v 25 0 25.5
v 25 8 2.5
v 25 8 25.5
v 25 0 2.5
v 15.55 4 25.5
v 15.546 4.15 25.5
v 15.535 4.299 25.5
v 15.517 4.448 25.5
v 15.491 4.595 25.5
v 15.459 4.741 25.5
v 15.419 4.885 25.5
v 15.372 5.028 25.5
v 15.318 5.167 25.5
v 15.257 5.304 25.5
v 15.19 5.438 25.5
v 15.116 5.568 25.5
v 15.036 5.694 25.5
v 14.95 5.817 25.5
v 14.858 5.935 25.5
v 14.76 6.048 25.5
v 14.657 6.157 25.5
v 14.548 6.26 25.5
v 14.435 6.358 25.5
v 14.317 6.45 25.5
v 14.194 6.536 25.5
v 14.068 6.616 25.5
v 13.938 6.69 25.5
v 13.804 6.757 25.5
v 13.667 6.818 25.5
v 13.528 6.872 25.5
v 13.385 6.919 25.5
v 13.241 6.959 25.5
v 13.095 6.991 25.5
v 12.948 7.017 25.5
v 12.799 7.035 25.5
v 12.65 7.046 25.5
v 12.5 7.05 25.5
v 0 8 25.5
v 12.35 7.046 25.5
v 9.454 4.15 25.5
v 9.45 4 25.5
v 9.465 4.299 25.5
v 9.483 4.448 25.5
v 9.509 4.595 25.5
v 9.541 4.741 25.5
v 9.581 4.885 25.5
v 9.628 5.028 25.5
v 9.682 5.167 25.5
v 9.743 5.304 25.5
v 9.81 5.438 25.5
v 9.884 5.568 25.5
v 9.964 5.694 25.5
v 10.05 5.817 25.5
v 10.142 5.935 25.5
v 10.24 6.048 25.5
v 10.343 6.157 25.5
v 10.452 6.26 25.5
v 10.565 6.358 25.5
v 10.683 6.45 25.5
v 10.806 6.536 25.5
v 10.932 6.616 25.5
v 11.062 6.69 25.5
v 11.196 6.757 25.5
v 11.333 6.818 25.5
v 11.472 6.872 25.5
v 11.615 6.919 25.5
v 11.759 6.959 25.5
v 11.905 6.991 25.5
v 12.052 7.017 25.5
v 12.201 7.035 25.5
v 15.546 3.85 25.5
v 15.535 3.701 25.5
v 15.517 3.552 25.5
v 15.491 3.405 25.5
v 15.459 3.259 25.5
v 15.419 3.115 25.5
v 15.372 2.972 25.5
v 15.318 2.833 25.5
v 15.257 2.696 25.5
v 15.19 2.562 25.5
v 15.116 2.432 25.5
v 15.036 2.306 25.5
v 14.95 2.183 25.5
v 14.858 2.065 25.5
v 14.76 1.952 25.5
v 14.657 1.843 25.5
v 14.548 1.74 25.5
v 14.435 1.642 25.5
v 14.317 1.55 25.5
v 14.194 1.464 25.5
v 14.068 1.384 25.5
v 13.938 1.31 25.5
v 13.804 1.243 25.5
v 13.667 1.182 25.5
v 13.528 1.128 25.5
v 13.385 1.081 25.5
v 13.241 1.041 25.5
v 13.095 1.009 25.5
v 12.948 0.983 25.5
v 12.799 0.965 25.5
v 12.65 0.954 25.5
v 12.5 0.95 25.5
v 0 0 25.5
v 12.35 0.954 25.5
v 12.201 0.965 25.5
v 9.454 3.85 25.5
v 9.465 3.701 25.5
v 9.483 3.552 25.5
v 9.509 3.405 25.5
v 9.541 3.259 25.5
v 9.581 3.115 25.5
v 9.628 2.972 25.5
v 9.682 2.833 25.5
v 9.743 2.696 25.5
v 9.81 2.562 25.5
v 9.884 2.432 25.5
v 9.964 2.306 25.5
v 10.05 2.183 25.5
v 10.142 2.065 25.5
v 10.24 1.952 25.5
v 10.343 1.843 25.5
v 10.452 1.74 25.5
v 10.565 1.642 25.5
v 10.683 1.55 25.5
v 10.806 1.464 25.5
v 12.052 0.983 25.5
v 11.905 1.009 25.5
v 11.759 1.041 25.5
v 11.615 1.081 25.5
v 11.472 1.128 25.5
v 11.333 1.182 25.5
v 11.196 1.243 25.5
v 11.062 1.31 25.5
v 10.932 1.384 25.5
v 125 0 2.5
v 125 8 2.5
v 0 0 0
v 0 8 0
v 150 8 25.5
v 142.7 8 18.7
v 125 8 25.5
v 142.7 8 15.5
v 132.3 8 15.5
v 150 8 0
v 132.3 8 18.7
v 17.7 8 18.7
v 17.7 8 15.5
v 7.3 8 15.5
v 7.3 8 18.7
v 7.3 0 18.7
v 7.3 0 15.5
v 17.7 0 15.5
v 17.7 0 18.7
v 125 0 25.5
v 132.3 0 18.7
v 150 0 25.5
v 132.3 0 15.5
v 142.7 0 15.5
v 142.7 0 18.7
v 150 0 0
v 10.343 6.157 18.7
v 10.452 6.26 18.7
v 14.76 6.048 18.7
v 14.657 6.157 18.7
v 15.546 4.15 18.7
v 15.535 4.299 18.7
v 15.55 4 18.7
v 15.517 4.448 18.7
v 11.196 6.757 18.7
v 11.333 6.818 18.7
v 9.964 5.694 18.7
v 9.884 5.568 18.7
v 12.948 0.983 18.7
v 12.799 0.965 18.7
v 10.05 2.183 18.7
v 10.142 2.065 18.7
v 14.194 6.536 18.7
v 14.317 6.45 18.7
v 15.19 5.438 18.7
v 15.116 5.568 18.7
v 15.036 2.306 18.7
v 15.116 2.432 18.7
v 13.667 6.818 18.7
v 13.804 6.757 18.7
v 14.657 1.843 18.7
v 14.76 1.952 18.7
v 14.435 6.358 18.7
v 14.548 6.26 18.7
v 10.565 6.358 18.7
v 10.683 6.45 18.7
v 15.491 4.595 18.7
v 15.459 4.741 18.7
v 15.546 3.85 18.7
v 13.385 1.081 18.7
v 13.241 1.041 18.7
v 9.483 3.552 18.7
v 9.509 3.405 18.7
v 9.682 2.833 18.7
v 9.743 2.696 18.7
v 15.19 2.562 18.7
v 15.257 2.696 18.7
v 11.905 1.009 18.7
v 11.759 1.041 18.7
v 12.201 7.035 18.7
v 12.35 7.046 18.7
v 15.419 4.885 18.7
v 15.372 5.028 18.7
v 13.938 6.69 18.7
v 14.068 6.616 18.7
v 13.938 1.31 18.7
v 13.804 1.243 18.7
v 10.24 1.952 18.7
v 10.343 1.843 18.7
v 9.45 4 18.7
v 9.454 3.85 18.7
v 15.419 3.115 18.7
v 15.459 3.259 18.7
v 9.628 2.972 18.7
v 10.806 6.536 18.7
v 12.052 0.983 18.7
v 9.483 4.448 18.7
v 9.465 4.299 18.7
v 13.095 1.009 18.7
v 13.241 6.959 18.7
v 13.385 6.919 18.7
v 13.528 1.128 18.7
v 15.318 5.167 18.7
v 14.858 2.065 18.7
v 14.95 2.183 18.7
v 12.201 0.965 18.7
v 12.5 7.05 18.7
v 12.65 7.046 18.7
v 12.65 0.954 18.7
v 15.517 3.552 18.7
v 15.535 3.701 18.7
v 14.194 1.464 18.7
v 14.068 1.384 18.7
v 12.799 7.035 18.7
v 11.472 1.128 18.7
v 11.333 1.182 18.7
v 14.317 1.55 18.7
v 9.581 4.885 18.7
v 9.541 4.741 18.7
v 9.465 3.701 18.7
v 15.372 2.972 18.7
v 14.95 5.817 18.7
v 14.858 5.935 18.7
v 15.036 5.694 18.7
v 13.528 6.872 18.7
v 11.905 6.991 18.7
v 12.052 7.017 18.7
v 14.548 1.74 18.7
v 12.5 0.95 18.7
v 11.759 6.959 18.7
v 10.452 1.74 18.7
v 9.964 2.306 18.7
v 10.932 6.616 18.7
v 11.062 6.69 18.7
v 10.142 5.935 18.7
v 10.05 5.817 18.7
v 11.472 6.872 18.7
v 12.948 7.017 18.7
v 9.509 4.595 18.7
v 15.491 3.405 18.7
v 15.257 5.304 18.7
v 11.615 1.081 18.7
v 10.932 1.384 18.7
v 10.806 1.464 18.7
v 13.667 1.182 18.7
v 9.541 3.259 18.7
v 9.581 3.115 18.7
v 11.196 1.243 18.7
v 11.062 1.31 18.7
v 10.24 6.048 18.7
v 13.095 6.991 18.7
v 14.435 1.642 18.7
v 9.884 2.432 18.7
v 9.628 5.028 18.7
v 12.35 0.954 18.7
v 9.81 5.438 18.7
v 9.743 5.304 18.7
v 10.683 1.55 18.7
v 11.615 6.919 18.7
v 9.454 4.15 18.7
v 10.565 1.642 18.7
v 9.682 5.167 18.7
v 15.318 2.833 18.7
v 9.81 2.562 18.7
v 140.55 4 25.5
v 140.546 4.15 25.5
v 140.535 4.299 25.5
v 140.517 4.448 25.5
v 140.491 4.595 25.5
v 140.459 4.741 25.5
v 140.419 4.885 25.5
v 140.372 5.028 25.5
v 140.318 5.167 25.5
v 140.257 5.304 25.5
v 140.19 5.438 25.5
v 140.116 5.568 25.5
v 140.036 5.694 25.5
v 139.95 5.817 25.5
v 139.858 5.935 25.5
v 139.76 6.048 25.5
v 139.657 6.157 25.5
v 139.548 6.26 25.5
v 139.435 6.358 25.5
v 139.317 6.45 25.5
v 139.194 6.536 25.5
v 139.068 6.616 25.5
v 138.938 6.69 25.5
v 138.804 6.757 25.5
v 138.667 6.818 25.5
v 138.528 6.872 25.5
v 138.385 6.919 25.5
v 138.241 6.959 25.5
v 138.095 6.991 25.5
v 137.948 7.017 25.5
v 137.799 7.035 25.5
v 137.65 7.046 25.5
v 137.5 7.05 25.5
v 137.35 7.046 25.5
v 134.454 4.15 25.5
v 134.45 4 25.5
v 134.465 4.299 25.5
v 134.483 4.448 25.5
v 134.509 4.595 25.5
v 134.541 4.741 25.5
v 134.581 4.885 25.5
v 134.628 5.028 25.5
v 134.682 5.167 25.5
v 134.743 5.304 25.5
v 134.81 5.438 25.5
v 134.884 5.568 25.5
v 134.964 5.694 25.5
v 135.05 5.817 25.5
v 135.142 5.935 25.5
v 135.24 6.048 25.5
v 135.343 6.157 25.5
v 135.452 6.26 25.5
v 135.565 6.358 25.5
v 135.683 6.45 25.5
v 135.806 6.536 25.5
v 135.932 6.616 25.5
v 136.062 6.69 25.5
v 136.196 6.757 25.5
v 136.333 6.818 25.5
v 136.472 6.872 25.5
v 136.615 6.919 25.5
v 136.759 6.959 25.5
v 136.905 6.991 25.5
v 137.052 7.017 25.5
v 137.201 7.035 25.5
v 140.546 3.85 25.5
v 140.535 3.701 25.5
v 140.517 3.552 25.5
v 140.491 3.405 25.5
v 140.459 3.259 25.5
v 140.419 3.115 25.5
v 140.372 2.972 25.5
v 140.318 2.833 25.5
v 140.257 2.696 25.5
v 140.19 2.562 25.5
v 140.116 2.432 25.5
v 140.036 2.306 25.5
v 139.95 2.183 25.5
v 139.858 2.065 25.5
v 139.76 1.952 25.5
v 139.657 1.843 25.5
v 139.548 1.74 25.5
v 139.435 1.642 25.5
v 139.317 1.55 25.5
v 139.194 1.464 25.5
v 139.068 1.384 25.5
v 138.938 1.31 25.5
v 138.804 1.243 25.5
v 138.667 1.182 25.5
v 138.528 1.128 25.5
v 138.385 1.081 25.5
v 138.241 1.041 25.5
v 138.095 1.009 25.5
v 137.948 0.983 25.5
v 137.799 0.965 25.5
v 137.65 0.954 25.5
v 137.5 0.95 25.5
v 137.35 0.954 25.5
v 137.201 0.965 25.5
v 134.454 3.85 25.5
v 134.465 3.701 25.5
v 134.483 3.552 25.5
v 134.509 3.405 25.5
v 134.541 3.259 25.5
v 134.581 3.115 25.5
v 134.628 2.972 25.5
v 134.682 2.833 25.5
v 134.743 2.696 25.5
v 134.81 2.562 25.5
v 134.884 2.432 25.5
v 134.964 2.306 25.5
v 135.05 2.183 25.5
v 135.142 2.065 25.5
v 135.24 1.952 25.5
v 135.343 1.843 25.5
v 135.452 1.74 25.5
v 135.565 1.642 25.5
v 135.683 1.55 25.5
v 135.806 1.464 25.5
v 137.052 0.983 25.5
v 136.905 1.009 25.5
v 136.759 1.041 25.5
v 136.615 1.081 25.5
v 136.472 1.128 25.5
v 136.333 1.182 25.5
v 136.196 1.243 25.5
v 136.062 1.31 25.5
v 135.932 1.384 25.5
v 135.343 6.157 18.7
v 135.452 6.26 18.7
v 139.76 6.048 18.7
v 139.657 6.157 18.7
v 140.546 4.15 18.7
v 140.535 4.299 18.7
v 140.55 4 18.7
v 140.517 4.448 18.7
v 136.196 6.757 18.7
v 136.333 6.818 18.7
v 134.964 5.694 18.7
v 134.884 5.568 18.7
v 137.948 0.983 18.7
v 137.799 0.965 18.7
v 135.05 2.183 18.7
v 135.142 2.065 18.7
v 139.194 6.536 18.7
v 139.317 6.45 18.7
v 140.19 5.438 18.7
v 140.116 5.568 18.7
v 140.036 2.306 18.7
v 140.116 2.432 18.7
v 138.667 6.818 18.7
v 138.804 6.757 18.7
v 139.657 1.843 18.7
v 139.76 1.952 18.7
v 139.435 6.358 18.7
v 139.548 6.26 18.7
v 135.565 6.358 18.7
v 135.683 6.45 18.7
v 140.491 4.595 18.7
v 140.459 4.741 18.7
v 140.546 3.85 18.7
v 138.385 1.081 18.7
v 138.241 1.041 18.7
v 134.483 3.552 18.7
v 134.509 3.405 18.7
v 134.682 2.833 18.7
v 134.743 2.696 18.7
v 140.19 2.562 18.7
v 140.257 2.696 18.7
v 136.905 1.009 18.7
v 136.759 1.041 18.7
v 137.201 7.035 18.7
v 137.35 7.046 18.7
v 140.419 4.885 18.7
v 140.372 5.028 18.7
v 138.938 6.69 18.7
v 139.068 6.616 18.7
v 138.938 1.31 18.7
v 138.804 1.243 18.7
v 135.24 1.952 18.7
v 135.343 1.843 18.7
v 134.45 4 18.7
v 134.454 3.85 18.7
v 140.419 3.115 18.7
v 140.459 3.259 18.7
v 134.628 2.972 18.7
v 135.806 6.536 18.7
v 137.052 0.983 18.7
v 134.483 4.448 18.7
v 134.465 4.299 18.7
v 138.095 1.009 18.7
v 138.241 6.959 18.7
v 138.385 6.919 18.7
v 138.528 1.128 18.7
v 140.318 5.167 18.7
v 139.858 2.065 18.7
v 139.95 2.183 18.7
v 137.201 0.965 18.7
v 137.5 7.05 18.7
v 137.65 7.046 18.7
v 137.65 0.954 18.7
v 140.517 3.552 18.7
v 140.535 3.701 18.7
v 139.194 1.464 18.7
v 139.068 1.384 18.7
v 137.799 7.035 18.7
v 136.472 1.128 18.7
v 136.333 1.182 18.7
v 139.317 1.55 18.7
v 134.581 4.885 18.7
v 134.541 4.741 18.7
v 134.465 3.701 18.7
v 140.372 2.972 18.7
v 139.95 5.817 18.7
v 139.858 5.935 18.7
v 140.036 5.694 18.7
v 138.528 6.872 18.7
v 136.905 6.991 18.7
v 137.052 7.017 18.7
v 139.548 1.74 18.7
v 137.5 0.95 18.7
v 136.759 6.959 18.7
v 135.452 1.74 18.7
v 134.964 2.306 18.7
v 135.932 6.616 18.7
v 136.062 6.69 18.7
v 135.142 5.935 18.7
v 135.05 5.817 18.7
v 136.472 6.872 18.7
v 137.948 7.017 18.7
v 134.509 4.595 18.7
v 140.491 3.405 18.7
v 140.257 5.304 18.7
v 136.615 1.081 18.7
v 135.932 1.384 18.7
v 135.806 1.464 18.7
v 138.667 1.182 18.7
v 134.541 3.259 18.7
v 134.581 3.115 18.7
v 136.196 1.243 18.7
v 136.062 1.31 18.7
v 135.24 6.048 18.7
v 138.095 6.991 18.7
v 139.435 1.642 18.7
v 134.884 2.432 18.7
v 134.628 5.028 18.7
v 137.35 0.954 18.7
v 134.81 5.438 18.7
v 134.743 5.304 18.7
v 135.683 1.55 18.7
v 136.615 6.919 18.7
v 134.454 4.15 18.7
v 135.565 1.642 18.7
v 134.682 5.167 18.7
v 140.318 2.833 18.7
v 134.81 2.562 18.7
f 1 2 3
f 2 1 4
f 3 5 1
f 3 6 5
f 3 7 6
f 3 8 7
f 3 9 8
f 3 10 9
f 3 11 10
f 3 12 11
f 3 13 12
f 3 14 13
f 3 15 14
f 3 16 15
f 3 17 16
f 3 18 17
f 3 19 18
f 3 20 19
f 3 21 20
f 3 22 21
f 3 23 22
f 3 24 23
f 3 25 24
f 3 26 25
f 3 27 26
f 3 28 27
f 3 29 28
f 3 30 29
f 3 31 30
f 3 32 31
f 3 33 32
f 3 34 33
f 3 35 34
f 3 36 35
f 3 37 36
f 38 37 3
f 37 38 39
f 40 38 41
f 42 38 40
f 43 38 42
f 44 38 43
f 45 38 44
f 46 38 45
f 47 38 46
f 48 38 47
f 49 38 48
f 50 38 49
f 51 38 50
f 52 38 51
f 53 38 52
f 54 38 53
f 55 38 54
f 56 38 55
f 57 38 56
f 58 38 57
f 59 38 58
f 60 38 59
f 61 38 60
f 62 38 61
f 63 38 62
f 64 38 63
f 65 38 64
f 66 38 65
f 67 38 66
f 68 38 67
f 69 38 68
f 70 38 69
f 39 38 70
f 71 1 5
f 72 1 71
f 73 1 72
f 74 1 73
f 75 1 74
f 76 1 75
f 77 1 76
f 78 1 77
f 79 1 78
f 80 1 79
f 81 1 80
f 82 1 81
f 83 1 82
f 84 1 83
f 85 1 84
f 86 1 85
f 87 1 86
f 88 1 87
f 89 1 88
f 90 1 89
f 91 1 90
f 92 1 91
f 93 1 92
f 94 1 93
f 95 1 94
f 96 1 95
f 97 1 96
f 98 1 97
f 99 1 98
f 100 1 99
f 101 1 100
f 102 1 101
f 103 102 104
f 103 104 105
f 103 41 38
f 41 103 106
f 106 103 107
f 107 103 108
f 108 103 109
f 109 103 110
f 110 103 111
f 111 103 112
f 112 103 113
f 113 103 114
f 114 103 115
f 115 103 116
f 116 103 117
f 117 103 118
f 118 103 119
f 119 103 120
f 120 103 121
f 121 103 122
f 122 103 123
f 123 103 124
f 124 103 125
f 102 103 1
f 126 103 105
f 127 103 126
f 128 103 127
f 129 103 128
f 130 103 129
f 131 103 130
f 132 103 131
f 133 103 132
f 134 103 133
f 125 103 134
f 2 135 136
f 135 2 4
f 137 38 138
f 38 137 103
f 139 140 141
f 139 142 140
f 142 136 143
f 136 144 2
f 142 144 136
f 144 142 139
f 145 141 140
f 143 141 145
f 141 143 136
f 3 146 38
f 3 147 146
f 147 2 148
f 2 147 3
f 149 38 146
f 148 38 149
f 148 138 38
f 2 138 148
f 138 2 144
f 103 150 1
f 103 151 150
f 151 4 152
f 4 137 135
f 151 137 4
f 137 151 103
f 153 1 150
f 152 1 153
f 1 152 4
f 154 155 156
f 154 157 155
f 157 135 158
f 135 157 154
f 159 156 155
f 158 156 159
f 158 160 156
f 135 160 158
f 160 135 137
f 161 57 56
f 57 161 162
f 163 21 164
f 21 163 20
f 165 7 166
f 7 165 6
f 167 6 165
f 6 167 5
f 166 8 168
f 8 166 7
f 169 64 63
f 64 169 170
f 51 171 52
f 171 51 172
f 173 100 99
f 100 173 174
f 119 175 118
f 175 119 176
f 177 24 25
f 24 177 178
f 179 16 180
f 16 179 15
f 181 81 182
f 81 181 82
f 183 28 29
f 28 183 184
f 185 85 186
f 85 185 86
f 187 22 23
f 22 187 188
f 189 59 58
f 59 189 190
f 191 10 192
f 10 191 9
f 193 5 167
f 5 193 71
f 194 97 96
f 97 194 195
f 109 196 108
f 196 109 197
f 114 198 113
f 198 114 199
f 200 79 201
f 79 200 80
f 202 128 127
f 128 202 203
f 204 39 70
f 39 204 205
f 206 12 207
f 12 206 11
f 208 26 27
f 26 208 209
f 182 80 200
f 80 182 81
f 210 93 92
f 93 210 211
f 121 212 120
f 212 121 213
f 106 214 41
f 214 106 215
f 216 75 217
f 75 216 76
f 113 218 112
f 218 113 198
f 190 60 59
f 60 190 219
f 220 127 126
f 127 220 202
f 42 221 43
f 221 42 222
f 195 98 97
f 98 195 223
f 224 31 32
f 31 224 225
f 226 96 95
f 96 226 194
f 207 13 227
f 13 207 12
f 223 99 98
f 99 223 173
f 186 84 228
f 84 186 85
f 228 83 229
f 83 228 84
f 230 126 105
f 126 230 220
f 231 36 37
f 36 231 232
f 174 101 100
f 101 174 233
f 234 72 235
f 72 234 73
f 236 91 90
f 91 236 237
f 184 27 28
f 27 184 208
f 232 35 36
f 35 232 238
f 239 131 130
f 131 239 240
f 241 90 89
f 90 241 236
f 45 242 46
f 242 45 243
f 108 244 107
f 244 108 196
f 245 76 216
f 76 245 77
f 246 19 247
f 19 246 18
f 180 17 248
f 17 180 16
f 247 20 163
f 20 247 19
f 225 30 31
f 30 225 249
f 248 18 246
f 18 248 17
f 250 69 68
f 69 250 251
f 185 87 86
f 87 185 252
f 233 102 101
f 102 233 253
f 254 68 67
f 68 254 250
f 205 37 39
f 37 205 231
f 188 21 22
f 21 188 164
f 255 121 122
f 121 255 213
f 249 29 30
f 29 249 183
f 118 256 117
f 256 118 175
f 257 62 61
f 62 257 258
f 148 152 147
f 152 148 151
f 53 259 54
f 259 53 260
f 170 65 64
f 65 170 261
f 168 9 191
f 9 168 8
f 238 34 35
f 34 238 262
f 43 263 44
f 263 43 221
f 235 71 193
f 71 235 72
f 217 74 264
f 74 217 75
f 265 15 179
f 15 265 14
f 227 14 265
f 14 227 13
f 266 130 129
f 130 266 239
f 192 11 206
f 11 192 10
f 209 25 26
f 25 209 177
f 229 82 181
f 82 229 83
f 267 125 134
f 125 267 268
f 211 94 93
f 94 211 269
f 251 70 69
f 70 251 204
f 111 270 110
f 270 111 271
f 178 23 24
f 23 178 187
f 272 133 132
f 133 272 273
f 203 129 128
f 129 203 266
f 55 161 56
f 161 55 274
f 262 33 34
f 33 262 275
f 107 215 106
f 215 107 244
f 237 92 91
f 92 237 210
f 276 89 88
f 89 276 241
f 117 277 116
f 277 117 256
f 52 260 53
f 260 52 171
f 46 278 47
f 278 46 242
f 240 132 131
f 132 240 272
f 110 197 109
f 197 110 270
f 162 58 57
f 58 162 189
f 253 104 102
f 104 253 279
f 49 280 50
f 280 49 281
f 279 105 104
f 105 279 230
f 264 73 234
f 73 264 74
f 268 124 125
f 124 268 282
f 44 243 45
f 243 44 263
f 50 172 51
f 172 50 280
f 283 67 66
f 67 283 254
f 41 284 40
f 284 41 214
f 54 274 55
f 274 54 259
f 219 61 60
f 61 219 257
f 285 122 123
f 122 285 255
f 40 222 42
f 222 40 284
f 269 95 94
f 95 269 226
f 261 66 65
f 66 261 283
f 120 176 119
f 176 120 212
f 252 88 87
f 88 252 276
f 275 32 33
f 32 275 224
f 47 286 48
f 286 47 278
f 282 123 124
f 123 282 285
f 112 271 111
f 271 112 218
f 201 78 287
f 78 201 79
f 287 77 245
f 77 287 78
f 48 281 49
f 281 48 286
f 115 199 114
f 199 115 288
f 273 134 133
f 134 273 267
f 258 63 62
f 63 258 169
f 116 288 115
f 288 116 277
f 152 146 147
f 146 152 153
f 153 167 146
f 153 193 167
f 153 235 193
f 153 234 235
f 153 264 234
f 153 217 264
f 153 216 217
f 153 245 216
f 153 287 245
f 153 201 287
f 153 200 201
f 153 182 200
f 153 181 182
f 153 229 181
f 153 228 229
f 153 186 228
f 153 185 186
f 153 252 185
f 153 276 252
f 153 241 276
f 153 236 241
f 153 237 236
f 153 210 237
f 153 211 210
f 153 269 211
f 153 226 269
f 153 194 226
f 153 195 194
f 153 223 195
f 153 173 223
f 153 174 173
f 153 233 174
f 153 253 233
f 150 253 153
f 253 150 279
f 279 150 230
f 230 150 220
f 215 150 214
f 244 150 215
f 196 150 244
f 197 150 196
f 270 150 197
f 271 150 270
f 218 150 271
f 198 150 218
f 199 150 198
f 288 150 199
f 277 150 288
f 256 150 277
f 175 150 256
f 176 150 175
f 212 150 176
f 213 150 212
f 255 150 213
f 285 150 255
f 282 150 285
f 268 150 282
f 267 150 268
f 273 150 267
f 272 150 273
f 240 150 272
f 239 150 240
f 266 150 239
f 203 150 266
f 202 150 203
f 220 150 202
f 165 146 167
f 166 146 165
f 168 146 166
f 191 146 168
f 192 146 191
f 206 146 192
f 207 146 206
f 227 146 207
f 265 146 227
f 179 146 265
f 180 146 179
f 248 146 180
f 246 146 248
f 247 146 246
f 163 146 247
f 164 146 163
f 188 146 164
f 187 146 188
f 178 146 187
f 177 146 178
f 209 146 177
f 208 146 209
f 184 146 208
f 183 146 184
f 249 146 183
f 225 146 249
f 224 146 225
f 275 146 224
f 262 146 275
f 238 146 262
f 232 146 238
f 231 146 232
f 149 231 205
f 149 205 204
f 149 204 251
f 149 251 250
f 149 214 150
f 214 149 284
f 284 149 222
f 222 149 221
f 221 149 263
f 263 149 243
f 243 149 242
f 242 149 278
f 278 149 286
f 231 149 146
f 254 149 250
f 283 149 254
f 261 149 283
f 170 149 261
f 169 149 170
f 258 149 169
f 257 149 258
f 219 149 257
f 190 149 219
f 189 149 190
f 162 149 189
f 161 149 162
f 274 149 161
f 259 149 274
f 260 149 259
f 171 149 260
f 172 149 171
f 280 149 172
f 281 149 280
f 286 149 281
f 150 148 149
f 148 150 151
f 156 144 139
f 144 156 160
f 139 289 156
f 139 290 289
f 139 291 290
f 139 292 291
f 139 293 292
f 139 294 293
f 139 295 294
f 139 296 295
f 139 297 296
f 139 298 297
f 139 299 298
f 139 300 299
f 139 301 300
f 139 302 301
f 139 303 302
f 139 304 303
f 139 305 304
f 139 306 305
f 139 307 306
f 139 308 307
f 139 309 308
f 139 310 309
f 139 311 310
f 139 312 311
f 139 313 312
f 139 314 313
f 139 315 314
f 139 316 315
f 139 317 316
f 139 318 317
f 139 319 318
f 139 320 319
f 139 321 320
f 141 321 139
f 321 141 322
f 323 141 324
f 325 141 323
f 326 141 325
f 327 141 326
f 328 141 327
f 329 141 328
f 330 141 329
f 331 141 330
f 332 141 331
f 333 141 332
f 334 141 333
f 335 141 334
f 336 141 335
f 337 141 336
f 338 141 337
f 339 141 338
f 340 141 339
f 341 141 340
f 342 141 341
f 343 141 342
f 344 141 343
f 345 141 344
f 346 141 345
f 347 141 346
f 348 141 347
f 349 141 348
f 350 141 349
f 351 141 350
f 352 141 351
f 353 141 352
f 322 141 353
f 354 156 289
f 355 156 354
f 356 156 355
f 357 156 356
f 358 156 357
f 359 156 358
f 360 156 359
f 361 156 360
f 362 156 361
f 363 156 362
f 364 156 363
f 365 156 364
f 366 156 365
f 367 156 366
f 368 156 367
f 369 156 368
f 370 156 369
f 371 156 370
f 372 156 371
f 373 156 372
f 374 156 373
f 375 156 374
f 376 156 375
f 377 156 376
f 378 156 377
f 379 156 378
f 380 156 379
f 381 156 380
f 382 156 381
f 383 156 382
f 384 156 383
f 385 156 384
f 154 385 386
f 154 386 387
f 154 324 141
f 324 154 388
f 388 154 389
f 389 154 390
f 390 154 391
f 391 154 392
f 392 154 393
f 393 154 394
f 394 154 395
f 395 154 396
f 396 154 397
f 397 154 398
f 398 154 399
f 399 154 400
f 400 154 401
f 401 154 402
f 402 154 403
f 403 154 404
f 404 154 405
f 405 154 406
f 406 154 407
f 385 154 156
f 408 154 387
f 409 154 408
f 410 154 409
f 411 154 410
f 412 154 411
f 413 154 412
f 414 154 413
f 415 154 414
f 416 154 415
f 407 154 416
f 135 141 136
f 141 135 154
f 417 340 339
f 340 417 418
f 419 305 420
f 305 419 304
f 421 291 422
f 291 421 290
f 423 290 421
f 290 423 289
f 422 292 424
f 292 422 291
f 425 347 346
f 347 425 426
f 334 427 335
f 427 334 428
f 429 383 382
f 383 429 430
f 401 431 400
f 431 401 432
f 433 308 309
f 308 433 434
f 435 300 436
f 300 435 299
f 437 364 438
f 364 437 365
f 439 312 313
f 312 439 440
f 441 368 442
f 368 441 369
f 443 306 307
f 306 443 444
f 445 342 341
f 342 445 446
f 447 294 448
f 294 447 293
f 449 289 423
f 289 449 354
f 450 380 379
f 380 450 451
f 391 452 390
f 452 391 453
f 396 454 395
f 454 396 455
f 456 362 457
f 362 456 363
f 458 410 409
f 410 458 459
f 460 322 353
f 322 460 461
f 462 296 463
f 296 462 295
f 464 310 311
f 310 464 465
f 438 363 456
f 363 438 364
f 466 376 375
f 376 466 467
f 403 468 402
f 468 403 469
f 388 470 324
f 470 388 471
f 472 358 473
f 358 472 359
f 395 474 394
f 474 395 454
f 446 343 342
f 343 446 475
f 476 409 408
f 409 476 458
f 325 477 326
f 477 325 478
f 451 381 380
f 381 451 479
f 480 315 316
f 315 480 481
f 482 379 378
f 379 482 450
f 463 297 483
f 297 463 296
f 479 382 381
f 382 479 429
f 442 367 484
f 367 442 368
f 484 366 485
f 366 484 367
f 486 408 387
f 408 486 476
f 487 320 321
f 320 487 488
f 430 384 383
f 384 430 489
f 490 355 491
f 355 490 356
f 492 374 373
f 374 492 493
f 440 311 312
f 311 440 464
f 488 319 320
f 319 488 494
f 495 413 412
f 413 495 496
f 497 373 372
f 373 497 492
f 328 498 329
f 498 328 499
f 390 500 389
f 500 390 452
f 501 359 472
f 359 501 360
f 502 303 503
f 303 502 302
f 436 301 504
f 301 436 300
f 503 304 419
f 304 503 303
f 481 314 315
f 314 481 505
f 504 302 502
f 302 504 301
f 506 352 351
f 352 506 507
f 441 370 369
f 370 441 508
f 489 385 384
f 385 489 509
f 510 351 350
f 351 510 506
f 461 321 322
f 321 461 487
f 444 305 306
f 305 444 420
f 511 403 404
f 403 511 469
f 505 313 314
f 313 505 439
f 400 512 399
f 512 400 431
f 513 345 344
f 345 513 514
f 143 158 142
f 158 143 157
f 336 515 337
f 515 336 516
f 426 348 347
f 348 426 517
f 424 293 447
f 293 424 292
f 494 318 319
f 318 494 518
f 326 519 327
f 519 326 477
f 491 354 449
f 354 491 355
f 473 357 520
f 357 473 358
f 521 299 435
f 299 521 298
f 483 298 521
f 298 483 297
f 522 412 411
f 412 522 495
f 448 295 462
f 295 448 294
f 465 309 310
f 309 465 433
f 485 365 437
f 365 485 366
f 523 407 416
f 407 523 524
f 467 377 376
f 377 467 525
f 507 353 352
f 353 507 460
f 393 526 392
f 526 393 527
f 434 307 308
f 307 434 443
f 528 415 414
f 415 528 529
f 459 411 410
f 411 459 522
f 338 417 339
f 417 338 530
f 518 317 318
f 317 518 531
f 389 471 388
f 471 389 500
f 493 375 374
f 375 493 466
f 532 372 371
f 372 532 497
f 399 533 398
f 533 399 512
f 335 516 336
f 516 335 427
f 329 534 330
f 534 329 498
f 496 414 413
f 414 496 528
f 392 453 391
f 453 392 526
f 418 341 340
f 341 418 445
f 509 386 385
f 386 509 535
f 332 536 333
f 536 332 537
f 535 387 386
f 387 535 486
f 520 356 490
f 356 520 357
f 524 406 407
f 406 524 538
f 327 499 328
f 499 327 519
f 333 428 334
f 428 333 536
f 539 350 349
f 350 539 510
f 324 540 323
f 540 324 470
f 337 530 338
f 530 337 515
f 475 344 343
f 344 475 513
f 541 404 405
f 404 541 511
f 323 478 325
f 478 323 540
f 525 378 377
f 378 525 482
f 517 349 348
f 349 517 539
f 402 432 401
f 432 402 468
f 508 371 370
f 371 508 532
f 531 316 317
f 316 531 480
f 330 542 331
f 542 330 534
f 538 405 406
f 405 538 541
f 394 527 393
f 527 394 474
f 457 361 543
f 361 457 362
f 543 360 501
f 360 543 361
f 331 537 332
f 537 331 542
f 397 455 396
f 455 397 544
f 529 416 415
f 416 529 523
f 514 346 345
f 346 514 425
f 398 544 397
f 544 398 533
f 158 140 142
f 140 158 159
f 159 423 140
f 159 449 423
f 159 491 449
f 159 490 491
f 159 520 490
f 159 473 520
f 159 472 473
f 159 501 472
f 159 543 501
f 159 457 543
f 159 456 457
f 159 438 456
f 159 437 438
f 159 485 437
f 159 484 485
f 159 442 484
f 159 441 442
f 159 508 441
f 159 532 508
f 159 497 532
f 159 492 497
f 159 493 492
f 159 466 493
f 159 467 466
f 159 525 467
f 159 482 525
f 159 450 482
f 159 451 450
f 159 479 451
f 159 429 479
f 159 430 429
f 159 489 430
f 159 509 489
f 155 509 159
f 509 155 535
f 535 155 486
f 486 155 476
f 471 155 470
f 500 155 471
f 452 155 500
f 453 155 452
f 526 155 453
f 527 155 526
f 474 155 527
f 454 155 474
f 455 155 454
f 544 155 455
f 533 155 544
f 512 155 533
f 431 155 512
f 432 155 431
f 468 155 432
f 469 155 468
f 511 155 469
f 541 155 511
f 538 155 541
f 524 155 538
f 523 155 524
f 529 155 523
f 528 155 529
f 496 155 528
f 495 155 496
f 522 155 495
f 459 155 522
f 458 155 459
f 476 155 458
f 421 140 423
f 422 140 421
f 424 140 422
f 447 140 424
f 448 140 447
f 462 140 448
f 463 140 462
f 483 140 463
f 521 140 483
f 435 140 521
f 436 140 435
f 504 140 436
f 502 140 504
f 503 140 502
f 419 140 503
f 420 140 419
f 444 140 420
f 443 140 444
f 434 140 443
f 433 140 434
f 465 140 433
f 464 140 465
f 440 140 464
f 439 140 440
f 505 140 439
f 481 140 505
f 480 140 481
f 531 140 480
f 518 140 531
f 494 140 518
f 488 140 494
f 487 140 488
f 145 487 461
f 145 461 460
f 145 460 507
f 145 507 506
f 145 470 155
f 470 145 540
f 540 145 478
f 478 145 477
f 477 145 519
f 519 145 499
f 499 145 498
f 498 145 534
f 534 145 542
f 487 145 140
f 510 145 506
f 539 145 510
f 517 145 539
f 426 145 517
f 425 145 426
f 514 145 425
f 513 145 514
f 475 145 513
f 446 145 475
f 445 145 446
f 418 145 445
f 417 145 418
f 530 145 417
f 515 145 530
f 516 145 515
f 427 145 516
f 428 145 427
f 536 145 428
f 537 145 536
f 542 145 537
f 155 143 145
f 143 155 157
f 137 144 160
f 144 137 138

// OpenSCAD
// file: common/prism.scad
// https://en.wikibooks.org/wiki/OpenSCAD_User_Manual/The_OpenSCAD_Language#polyhedron
module prism(l, w, h){
   polyhedron(
           points=[[0,0,0], [l,0,0], [l,w,0], [0,w,0], [0,w,h], [l,w,h]],
           faces=[[0,1,2,3],[5,4,3,2],[0,4,5,1],[0,3,4],[5,2,1]]
           );
}
// main file
use <common/prism.scad>

fn = 128;
inner_width = 100;
rail_edge_width = 9;
rail_thickness = 25;
flange_thickness = 2.5;
width = 8;
base_length = inner_width + rail_thickness*2;
m6_radius = 6.1 / 2;
total_height = 25.5;
m6_depth = 10;
nut_width = 10.4;
nut_height=3.2;
attach_point_height = total_height-flange_thickness;

module attach_point() {
  difference() {
    cube(size = [rail_thickness, width, attach_point_height]);
    translate([
      rail_thickness/2,
      width/2,
      attach_point_height-m6_depth
    ])
    cylinder(h = m6_depth,
          r1 = m6_radius,
          r2 = m6_radius, $fn=fn);
    translate([
      rail_thickness/2-nut_width/2,
      0,
      attach_point_height-m6_depth
    ])
    cube(size = [nut_width, width, nut_height]);
  }
}

module render() {
  union() {
    translate([0, 0, flange_thickness])
    attach_point();
    translate([base_length-rail_thickness, 0, flange_thickness])
    attach_point();
    cube(size = [base_length, width, flange_thickness]);
  }
}

echo(version=version());

render();
